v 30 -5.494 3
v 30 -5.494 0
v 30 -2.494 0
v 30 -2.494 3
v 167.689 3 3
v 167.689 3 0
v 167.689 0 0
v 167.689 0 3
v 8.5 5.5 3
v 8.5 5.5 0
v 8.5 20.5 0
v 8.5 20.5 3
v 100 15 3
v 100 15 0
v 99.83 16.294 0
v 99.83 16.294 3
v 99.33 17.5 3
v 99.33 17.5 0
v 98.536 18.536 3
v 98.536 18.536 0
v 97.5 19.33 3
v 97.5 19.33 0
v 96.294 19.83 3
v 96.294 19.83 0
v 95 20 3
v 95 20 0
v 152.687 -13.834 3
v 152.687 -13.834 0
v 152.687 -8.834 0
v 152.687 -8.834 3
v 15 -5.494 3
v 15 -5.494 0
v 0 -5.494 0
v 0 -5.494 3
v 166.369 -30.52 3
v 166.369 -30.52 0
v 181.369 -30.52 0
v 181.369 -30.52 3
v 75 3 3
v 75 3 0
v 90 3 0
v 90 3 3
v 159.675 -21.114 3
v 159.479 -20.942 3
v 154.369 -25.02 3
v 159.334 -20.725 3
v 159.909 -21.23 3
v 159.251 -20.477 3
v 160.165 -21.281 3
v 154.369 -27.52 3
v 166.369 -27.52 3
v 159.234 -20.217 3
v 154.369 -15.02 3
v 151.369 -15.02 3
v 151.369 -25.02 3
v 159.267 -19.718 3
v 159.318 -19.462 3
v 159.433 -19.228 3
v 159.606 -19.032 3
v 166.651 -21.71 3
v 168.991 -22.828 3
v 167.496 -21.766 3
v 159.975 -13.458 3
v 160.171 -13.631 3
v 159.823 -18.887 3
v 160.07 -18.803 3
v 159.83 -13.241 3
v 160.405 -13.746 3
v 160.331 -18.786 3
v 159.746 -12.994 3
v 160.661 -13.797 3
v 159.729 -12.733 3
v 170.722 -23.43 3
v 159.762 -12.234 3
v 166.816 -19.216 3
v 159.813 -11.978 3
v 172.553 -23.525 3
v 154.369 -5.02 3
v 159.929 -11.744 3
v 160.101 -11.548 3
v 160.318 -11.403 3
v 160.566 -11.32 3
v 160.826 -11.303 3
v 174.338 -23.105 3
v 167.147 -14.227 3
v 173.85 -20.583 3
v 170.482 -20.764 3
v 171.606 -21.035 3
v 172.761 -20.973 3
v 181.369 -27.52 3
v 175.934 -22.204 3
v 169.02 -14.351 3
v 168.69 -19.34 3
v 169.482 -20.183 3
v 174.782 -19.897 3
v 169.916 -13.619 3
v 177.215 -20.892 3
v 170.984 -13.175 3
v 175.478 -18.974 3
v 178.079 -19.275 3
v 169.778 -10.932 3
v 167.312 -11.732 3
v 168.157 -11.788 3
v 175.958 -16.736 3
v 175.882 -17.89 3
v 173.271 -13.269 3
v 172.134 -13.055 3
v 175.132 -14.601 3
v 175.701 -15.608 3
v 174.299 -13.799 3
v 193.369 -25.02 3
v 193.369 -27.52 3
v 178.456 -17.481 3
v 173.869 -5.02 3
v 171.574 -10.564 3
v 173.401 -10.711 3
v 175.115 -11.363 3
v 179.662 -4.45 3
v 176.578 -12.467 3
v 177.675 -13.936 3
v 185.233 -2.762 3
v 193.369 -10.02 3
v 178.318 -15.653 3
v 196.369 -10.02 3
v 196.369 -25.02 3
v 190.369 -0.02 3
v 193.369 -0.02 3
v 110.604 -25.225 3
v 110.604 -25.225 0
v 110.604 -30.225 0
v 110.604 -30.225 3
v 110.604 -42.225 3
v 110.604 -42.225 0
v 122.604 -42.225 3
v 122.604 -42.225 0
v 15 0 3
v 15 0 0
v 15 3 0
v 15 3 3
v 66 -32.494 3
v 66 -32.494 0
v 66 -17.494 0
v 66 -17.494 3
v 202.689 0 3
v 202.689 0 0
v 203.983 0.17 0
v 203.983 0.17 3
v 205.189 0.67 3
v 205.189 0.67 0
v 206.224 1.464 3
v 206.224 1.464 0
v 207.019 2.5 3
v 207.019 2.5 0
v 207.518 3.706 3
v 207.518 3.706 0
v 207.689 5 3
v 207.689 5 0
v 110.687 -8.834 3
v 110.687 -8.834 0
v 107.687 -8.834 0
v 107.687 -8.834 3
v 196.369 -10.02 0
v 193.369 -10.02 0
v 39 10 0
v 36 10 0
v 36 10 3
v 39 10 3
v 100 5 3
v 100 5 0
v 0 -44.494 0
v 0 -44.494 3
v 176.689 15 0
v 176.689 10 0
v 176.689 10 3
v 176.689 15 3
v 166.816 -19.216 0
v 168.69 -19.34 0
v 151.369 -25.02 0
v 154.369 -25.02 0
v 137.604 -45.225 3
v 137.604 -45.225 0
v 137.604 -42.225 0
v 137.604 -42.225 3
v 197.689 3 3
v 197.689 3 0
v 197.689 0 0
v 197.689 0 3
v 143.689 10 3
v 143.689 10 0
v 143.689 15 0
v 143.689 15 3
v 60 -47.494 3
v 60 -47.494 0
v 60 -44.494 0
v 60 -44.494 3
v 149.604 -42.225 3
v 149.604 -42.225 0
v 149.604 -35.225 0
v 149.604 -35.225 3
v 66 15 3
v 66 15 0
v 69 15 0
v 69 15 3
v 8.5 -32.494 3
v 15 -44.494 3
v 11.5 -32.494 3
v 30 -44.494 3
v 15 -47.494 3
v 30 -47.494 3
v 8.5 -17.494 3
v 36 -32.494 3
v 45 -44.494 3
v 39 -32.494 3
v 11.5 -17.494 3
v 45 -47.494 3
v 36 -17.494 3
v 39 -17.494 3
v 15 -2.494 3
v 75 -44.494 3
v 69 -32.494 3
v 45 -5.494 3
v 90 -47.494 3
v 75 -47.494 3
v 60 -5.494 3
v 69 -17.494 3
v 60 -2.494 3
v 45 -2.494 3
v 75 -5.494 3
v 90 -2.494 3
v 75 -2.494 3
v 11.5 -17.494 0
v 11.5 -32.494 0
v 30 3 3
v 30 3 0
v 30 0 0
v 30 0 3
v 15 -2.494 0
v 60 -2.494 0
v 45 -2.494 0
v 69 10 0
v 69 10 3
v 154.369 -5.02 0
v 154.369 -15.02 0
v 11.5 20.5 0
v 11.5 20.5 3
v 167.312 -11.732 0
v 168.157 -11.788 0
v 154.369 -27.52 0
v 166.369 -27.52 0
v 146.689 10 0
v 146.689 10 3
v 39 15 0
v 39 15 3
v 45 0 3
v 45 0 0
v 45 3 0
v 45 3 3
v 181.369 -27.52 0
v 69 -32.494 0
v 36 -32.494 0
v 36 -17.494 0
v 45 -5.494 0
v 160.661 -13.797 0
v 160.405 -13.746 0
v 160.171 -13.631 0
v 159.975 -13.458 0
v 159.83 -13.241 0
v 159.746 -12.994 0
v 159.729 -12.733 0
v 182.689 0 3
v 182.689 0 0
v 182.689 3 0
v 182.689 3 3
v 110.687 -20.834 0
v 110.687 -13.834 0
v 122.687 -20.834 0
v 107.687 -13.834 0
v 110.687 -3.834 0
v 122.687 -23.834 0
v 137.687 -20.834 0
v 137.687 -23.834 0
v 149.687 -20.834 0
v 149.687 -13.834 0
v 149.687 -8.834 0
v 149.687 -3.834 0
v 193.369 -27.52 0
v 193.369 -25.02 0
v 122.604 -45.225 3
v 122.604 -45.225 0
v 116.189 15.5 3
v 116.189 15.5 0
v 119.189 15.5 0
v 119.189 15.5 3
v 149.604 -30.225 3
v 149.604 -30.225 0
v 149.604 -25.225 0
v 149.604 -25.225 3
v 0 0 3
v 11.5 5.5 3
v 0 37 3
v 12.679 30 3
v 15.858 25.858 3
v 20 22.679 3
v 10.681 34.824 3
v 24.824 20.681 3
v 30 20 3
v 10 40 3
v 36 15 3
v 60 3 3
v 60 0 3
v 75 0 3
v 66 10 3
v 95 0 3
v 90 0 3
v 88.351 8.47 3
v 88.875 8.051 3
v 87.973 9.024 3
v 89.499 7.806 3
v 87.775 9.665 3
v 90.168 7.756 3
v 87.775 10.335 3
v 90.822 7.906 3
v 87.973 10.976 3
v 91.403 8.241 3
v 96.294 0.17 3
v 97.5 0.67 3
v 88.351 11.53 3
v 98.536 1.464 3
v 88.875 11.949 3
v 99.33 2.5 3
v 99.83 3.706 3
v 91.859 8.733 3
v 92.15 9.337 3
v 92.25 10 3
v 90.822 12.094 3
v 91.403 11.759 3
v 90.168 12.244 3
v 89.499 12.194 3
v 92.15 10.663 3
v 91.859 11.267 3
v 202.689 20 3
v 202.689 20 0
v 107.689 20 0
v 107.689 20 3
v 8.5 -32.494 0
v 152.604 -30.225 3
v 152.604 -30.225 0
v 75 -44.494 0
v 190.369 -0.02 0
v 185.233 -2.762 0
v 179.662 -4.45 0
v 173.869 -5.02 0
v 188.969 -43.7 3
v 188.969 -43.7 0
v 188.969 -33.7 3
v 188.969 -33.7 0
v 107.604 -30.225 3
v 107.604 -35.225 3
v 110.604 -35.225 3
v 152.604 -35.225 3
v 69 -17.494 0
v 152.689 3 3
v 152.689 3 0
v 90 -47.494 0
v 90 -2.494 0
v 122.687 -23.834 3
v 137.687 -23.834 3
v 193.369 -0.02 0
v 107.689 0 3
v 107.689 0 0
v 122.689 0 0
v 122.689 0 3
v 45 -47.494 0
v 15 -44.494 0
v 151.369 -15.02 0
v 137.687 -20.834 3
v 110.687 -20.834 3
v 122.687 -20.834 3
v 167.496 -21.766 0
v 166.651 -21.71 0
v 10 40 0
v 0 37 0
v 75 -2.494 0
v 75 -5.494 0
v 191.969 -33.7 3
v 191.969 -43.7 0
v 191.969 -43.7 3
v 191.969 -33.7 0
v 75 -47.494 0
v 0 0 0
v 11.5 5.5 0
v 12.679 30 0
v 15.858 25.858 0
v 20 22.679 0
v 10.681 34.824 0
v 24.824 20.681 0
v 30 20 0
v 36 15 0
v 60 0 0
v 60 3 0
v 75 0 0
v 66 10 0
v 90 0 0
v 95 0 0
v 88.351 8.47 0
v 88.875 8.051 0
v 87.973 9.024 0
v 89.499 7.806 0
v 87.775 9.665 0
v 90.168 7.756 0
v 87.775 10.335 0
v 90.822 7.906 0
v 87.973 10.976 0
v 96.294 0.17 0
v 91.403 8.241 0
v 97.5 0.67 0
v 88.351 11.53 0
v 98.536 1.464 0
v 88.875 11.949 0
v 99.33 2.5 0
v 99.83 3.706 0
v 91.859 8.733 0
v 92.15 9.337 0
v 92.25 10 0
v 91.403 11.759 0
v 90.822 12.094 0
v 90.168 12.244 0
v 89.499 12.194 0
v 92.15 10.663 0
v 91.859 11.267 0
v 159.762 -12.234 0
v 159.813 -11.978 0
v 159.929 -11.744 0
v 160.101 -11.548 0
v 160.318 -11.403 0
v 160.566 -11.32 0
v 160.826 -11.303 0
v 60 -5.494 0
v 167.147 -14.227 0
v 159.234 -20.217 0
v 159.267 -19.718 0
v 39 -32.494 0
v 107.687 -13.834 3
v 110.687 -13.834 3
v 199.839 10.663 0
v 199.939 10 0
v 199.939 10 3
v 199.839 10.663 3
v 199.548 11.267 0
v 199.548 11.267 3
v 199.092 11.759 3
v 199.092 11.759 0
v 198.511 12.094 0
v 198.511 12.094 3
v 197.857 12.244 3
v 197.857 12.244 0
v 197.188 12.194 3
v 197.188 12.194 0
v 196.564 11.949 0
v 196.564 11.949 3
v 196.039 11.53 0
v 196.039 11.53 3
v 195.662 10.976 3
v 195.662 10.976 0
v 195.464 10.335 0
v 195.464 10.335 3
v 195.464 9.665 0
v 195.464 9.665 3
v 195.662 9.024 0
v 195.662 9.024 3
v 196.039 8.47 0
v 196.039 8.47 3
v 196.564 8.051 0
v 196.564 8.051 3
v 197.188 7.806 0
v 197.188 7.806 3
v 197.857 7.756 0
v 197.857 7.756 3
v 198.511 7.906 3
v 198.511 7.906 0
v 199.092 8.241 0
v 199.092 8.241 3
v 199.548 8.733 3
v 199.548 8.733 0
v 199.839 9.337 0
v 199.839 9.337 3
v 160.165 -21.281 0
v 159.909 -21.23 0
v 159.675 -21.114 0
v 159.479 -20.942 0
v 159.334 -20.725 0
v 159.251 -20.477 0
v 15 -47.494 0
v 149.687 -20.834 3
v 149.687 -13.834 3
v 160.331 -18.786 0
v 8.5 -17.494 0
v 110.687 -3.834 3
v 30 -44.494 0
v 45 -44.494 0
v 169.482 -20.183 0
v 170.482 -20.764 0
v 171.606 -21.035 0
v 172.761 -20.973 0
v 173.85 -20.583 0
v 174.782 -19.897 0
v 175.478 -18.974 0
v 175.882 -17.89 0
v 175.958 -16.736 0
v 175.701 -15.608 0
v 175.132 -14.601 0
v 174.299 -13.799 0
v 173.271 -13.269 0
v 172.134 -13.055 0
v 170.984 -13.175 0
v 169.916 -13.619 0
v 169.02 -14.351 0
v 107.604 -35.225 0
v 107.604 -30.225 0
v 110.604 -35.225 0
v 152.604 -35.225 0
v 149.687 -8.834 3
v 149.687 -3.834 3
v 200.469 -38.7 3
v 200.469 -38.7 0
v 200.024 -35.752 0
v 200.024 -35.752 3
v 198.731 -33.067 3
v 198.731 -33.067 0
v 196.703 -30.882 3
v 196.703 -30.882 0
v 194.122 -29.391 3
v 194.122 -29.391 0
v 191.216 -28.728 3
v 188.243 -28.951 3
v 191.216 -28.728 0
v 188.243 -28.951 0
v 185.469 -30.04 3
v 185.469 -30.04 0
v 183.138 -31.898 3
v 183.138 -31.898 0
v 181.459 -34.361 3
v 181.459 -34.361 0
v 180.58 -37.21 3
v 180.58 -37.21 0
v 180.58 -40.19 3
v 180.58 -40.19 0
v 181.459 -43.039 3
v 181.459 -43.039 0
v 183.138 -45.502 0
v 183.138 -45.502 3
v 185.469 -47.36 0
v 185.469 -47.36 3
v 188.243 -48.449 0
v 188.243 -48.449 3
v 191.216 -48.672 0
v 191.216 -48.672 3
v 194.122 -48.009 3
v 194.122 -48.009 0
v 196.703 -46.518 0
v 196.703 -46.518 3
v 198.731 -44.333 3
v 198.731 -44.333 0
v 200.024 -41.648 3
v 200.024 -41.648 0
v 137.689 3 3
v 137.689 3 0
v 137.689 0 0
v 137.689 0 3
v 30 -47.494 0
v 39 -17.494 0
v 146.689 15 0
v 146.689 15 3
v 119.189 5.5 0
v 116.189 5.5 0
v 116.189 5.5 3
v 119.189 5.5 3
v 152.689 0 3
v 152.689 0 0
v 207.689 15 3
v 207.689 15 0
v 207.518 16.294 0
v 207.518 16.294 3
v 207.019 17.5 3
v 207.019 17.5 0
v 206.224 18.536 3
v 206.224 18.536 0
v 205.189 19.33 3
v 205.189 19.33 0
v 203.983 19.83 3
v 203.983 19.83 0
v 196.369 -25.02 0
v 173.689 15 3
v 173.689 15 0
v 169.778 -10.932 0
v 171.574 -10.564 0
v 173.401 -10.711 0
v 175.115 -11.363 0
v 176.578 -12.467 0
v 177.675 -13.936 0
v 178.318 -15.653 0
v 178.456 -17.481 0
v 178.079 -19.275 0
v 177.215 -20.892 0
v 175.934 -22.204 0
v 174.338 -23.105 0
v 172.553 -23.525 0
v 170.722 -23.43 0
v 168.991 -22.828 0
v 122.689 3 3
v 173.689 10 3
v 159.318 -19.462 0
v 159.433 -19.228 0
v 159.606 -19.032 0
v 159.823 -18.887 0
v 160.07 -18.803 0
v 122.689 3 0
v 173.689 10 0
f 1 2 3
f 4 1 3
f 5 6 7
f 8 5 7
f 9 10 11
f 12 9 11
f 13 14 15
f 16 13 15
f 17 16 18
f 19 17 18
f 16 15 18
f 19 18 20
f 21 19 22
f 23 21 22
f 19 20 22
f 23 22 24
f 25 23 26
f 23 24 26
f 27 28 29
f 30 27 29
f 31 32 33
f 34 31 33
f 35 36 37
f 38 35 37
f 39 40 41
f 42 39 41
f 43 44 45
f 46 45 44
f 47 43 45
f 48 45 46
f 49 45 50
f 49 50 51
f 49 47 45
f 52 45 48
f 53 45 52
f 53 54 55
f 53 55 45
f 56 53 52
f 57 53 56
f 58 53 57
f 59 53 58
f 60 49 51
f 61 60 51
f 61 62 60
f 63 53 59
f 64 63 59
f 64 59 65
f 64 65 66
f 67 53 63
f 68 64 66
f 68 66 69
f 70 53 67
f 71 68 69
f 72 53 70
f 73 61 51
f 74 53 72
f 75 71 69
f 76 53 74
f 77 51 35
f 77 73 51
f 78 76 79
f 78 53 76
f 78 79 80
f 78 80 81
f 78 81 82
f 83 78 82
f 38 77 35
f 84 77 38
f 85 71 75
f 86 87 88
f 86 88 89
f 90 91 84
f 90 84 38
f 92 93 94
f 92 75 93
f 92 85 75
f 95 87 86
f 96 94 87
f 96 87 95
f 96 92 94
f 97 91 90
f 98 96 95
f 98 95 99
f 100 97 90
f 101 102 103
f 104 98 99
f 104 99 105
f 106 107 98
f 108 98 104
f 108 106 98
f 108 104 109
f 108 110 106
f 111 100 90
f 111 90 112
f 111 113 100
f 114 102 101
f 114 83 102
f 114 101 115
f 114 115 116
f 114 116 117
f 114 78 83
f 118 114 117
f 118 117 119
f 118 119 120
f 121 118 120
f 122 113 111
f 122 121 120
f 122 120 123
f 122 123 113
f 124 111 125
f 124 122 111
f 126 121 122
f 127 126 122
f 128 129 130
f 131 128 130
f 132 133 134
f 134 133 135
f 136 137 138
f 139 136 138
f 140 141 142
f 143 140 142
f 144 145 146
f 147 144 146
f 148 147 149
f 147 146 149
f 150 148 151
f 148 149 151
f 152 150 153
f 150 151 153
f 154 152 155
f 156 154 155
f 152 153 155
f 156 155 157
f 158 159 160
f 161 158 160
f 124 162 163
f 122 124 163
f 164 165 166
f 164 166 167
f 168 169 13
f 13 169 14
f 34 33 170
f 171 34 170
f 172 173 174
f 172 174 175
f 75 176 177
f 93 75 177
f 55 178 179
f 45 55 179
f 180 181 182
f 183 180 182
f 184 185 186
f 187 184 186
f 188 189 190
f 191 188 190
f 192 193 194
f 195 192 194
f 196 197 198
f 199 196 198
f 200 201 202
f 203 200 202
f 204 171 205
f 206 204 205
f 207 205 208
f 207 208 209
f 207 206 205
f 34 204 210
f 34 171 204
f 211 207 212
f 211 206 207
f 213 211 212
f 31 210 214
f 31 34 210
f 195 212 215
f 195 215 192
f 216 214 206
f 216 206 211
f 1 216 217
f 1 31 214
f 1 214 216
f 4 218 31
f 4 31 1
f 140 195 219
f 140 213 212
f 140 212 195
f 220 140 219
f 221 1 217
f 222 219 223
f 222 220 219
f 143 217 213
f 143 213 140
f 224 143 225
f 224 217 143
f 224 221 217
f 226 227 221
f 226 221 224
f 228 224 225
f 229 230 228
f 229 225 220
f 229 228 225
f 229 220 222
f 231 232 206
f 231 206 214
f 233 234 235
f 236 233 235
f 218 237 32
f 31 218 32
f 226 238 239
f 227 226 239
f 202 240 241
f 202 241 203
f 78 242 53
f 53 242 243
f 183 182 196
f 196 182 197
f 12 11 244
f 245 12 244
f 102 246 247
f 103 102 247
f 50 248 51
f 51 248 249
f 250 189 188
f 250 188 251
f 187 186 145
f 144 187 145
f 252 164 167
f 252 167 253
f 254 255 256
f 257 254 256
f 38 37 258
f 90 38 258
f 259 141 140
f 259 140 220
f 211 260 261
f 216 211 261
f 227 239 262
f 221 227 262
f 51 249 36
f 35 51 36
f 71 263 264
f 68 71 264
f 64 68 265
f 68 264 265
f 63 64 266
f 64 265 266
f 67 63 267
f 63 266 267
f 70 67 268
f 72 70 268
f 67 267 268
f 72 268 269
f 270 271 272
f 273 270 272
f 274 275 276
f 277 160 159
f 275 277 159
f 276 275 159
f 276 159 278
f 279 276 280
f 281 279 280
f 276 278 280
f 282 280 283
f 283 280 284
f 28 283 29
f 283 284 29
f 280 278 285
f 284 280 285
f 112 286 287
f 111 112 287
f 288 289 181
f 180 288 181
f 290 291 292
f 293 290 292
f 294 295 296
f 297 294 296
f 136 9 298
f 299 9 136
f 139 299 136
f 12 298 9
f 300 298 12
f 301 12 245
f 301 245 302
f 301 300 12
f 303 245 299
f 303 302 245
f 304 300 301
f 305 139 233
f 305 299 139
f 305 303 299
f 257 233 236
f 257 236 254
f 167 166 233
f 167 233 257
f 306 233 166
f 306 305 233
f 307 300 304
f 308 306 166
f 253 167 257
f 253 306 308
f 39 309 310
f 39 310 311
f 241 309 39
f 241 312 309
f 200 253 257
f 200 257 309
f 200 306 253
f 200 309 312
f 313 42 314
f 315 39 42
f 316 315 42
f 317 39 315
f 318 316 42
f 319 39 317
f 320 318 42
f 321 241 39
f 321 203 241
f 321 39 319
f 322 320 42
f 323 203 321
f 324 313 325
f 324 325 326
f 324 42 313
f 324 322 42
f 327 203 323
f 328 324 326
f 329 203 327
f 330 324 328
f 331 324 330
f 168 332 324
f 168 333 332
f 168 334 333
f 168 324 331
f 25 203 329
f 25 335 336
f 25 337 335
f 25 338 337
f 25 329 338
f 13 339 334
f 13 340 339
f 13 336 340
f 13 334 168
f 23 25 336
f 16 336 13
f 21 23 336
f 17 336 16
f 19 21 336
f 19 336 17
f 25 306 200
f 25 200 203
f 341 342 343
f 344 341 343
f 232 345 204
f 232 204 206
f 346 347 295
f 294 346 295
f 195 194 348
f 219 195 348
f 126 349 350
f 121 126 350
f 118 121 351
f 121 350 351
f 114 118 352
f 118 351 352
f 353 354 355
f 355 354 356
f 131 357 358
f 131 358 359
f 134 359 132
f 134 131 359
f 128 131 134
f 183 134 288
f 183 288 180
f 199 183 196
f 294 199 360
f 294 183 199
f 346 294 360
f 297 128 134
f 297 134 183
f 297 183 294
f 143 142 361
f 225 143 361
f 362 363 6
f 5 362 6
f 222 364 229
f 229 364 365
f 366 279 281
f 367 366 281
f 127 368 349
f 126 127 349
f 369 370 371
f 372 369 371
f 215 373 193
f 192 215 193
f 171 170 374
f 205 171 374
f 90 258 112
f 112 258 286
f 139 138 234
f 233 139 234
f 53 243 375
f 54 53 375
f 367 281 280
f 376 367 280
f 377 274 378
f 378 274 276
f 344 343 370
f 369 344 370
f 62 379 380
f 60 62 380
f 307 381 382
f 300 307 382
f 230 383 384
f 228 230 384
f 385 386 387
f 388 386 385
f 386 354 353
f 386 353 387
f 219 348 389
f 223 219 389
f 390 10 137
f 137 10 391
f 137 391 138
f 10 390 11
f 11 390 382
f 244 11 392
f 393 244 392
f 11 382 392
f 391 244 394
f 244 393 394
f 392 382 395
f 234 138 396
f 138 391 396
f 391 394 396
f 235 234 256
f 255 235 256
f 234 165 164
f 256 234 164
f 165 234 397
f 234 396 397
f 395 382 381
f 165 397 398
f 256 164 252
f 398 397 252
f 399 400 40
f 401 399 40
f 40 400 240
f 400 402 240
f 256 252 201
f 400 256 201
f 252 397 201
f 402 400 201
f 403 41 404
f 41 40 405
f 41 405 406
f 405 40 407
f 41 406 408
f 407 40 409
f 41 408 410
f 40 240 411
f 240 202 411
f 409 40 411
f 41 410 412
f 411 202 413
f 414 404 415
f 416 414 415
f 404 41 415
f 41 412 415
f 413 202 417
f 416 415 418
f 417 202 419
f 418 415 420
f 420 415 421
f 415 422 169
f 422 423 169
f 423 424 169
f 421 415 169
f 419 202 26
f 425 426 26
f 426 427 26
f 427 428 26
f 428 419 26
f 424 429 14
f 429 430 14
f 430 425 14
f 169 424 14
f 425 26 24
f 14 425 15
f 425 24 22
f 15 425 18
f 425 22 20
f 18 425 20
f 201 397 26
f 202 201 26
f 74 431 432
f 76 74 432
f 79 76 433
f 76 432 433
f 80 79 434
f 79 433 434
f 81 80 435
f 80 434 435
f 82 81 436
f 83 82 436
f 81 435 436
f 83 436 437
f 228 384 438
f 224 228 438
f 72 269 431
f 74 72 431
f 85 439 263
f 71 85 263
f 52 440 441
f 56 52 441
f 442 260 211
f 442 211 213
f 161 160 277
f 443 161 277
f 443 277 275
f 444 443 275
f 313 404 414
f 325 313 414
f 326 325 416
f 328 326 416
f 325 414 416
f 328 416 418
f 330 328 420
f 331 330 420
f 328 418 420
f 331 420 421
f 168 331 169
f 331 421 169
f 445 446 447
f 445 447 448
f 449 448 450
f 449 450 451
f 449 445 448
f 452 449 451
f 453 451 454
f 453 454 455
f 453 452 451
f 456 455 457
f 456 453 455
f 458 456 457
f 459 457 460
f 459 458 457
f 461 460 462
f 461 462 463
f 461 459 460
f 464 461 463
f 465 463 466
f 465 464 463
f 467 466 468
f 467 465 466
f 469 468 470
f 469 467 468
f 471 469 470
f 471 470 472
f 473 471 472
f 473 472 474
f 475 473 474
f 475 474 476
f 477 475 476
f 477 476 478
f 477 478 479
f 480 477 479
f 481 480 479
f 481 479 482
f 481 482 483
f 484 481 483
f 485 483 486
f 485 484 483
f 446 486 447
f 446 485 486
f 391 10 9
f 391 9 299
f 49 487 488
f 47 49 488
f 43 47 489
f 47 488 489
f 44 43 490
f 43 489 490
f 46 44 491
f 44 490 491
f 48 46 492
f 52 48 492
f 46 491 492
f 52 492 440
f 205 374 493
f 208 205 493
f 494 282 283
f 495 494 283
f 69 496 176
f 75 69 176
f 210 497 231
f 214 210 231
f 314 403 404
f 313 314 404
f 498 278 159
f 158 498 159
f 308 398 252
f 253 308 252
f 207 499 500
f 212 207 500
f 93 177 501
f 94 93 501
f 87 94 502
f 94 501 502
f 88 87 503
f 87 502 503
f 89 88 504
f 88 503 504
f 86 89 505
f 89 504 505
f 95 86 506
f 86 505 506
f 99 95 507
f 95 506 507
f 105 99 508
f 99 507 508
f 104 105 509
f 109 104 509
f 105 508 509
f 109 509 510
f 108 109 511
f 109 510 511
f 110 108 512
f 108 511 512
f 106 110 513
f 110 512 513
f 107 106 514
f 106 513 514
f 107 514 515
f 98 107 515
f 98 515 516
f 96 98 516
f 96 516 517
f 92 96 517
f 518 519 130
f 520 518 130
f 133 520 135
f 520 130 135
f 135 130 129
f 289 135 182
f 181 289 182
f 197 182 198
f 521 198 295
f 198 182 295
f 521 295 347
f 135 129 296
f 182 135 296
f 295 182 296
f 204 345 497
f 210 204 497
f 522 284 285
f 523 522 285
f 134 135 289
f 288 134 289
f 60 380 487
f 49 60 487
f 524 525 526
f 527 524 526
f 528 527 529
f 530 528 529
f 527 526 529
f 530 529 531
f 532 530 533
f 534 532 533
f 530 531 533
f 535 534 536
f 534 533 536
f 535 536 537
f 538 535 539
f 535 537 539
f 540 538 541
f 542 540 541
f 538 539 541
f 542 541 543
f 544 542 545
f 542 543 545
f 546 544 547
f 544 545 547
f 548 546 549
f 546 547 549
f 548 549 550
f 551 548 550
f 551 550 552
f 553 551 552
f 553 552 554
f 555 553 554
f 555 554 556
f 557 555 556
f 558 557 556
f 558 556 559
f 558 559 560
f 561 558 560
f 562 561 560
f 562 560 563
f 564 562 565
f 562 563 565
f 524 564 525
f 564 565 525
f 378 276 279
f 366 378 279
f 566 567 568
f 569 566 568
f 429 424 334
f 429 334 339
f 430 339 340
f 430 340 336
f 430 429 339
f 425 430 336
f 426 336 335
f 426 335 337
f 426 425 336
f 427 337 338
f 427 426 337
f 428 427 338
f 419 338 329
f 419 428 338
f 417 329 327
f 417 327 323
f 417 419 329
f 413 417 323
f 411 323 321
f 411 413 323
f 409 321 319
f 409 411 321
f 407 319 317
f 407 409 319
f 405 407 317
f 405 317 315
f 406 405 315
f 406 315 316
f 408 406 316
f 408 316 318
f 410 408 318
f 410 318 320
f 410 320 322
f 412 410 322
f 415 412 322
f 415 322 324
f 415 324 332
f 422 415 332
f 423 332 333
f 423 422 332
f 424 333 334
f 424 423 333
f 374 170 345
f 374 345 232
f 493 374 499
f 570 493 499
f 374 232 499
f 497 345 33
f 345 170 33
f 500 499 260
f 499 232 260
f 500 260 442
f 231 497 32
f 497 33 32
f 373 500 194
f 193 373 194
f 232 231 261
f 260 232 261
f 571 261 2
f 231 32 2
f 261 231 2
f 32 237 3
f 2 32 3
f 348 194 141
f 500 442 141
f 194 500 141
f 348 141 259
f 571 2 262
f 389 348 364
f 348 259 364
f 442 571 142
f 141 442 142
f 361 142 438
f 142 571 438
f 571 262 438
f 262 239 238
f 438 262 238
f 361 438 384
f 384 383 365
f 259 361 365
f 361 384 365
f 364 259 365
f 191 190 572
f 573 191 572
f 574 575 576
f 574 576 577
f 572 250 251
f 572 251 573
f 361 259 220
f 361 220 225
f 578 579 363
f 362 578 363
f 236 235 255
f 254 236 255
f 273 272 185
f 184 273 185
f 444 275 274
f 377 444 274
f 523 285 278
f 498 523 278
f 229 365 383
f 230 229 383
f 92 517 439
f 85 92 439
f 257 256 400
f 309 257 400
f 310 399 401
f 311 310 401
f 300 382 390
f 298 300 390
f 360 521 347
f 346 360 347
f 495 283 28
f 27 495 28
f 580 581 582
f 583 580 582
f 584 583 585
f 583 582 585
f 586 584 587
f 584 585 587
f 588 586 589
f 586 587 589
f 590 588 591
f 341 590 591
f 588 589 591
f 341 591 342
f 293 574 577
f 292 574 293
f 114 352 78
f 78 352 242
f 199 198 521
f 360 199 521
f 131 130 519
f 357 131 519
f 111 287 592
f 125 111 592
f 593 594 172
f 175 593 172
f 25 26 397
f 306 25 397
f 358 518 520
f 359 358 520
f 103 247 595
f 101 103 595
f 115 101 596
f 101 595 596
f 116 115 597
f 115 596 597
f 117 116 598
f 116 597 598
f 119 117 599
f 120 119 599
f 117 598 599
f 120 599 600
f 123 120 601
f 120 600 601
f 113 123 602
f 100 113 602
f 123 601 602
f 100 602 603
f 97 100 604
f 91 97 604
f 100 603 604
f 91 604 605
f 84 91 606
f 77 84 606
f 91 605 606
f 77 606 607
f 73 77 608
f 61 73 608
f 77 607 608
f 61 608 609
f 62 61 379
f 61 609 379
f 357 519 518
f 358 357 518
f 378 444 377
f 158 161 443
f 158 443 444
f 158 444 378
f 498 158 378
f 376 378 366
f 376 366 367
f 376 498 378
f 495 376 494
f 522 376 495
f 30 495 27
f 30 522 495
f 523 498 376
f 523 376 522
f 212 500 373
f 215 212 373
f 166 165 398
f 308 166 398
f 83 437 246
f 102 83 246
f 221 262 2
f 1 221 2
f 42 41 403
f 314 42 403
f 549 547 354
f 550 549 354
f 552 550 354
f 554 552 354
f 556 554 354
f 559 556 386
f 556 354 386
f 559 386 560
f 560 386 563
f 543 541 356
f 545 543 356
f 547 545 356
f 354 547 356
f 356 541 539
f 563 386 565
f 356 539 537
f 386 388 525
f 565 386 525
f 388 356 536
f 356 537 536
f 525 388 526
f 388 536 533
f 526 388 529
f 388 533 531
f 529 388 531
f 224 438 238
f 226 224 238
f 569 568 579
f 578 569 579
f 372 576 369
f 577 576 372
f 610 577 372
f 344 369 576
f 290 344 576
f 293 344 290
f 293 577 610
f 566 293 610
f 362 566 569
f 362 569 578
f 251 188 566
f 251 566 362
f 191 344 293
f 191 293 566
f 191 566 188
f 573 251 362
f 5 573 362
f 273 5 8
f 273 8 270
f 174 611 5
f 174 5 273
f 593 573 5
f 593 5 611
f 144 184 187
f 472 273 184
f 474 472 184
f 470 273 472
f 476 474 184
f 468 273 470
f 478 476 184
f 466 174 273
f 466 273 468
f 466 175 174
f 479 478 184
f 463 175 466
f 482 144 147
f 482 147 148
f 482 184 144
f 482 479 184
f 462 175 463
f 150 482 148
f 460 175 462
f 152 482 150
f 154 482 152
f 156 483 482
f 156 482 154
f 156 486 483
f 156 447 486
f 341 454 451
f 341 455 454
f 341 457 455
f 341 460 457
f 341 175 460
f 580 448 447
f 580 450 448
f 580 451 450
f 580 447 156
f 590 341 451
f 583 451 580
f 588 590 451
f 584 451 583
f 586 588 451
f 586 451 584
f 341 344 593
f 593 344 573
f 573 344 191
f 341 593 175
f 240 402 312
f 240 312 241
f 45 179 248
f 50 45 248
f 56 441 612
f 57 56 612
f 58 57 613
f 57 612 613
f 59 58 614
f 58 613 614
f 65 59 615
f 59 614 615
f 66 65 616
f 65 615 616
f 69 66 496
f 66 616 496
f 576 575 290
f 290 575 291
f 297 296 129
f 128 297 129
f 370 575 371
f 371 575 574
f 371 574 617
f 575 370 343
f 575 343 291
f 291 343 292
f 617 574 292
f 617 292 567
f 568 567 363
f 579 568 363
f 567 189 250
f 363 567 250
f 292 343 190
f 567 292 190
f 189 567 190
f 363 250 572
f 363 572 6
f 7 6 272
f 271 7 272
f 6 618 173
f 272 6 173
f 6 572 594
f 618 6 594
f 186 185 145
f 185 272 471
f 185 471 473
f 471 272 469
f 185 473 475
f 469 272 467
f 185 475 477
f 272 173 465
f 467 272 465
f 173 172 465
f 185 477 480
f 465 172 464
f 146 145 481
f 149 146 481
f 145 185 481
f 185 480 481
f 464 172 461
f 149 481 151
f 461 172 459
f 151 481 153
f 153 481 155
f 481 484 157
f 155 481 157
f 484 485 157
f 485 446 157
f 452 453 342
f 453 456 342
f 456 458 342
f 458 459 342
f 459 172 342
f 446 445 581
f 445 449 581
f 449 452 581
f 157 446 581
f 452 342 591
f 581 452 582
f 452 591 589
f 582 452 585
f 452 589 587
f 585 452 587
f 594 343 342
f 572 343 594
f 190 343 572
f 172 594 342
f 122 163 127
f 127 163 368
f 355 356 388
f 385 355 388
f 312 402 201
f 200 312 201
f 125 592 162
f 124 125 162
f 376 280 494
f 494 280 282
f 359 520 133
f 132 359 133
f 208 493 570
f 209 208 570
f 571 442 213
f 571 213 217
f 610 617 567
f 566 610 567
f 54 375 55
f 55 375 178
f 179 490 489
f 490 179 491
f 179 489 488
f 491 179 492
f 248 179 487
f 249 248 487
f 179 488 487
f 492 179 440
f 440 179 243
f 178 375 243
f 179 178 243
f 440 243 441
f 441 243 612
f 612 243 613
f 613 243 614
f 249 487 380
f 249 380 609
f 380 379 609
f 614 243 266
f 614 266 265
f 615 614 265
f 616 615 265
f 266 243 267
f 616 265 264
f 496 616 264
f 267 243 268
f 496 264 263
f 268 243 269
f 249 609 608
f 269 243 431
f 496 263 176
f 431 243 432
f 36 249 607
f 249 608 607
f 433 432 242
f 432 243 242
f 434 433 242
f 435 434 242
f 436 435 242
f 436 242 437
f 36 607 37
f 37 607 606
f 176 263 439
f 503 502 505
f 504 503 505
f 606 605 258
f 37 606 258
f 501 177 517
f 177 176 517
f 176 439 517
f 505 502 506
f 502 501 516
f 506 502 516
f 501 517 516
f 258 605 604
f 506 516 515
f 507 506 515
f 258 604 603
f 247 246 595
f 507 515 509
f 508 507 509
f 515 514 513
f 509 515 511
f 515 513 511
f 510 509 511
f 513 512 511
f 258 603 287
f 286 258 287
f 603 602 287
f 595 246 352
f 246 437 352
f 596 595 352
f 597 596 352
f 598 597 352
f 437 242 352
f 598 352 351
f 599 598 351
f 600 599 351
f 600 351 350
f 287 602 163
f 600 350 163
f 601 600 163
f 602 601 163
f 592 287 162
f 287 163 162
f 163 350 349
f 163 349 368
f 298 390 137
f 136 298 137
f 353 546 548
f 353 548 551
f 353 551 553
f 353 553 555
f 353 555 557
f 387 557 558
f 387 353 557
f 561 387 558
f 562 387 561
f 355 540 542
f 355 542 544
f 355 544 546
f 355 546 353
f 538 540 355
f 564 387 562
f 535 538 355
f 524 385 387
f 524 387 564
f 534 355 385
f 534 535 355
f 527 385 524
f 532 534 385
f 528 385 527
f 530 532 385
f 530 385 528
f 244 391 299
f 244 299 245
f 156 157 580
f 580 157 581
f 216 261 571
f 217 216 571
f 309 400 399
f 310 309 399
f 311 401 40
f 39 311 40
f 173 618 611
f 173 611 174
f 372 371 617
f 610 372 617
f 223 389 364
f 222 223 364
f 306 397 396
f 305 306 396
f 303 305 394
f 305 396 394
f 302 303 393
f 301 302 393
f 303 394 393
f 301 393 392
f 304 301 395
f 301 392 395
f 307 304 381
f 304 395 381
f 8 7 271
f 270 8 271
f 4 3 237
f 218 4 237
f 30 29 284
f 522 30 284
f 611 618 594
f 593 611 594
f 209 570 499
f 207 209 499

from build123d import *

# Parameters (mm, degrees)
F1_R     = 10
F1_W     = 3
F1_H     = 10
F2_DEPTH = 3
F1_H_2   = 5
F1_R_2   = 2.25
F1_H_3   = 15


# Not quite as in the source:
# - a feature names something its author has since deleted; it is built from what else it names


with BuildPart() as f2:
    # F1 (on Top) → F2 (new body)
    with BuildSketch(Plane.XY):
        with Locations((190.4685690403, -38.7000021338)):
            Circle(F1_R)
        with Locations((190.4685690403, -38.7000021338)):
            Rectangle(F1_W, F1_H, mode=Mode.SUBTRACT)
    extrude(amount=F2_DEPTH)


with BuildPart() as f2b:
    # F1 (on Top) → F2, piece 2 (new body)
    with BuildSketch(Plane.XY):
        with BuildLine():
            Line((154.3685435057, -25.0202883035), (154.3685435057, -27.5202883035))
            Line((154.3685435057, -27.5202883035), (166.3685435057, -27.5202883035))
            Line((166.3685435057, -27.5202883035), (166.3685435057, -30.5202883035))
            Line((166.3685435057, -30.5202883035), (173.8685435057, -30.5202883035))
            Line((173.8685435057, -30.5202883035), (181.3685435057, -30.5202883035))
            Line((181.3685435057, -30.5202883035), (181.3685435057, -27.5202883035))
            Line((181.3685435057, -27.5202883035), (193.3685435057, -27.5202883035))
            Line((193.3685435057, -27.5202883035), (193.3685435057, -25.0202883035))
            Line((193.3685435057, -25.0202883035), (196.3685435057, -25.0202883035))
            Line((196.3685435057, -25.0202883035), (196.3685435057, -10.0202883035))
            Line((196.3685435057, -10.0202883035), (193.3685435057, -10.0202883035))
            Line((193.3685435057, -10.0202883035), (193.3685435057, -0.0202883035))
            Line((193.3685435057, -0.0202883035), (190.3685435057, -0.0202883035))
            ThreePointArc((190.3685435057, -0.0202883035), (182.4890133305, -3.7428387253), (173.8685435057, -5.0202883035))
            Line((173.8685435057, -5.0202883035), (154.3685435057, -5.0202883035))
            Line((154.3685435057, -5.0202883035), (154.3685435057, -15.0202883035))
            Line((154.3685435057, -15.0202883035), (151.3685435057, -15.0202883035))
            Line((151.3685435057, -15.0202883035), (151.3685435057, -25.0202883035))
            Line((151.3685435057, -25.0202883035), (154.3685435057, -25.0202883035))
        make_face()
        with BuildLine():
            Line((169.0201585277, -14.3506918411), (167.1467590467, -14.2266580037))
            Line((167.1467590467, -14.2266580037), (160.6609587085, -13.7972468117))
            ThreePointArc((160.6609587085, -13.7972468117), (159.9747461278, -13.4582796573), (159.7292065321, -12.7333681147))
            Line((159.7292065321, -12.7333681147), (159.7622381623, -12.2344603964))
            ThreePointArc((159.7622381623, -12.2344603964), (160.1012053166, -11.5482478157), (160.8261168592, -11.30270822))
            Line((160.8261168592, -11.30270822), (167.3119171975, -11.7321194121))
            Line((167.3119171975, -11.7321194121), (168.1567556224, -11.7880543864))
            ThreePointArc((168.1567556224, -11.7880543864), (178.4564784175, -17.480924089), (167.4961230192, -21.766208753))
            Line((167.4961230192, -21.766208753), (166.6512845944, -21.7102737787))
            Line((166.6512845944, -21.7102737787), (160.1654842561, -21.2808625866))
            ThreePointArc((160.1654842561, -21.2808625866), (159.4792716754, -20.9418954323), (159.2337320797, -20.2169838897))
            Line((159.2337320797, -20.2169838897), (159.2667637099, -19.7180761713))
            ThreePointArc((159.2667637099, -19.7180761713), (159.6057308643, -19.0318635907), (160.3306424069, -18.786323995))
            Line((160.3306424069, -18.786323995), (166.8164427452, -19.215735187))
            Line((166.8164427452, -19.215735187), (168.6898422261, -19.3397690244))
            ThreePointArc((168.6898422261, -19.3397690244), (175.9619398259, -17.3157659382), (169.0201585277, -14.3506918411))
        make_face(mode=Mode.SUBTRACT)
    extrude(amount=F2_DEPTH)


with BuildPart() as f2c:
    # F1 (on Top) → F2, piece 3 (new body)
    with BuildSketch(Plane.XY):
        with BuildLine():
            Line((107.6887845993, 20), (107.6887845993, 0))
            Line((107.6887845993, 0), (122.6887845993, 0))
            Line((122.6887845993, 0), (122.6887845993, 3))
            Line((122.6887845993, 3), (137.6887845993, 3))
            Line((137.6887845993, 3), (137.6887845993, 0))
            Line((137.6887845993, 0), (152.6887845993, 0))
            Line((152.6887845993, 0), (152.6887845993, 3))
            Line((152.6887845993, 3), (167.6887845993, 3))
            Line((167.6887845993, 3), (167.6887845993, 0))
            Line((167.6887845993, 0), (182.6887845993, 0))
            Line((182.6887845993, 0), (182.6887845993, 3))
            Line((182.6887845993, 3), (197.6887845993, 3))
            Line((197.6887845993, 3), (197.6887845993, 0))
            Line((197.6887845993, 0), (202.6887845993, 0))
            ThreePointArc((202.6887845993, 0), (206.2243185052, 1.4644660941), (207.6887845993, 5))
            Line((207.6887845993, 5), (207.6887845993, 15))
            ThreePointArc((207.6887845993, 15), (206.2243185052, 18.5355339059), (202.6887845993, 20))
            Line((202.6887845993, 20), (137.6887845993, 20))
            Line((137.6887845993, 20), (107.6887845993, 20))
        make_face()
        with Locations((117.6887845993, 10.5)):
            Rectangle(F1_W, F1_H, mode=Mode.SUBTRACT)
        with Locations((145.1887845993, 12.5)):
            Rectangle(F1_W, F1_H_2, mode=Mode.SUBTRACT)
        with Locations((175.1887845993, 12.5)):
            Rectangle(F1_W, F1_H_2, mode=Mode.SUBTRACT)
        with Locations((197.6887845993, 10)):
            Circle(F1_R_2, mode=Mode.SUBTRACT)
    extrude(amount=F2_DEPTH)


with BuildPart() as f2d:
    # F1 (on Top) → F2, piece 4 (new body)
    with BuildSketch(Plane.XY):
        Polygon((15, -5.493568331), (0, -5.493568331), (0, -24.993568331), (0, -44.493568331), (15, -44.493568331), (15, -47.493568331), (30, -47.493568331), (30, -44.493568331), (45, -44.493568331), (45, -47.493568331), (60, -47.493568331), (60, -44.493568331), (75, -44.493568331), (75, -47.493568331), (90, -47.493568331), (90, -44.493568331), (90, -24.993568331), (90, -5.493568331), (90, -2.493568331), (75, -2.493568331), (75, -5.493568331), (60, -5.493568331), (60, -2.493568331), (45, -2.493568331), (45, -5.493568331), (30, -5.493568331), (30, -2.493568331), (15, -2.493568331), align=None)
        with Locations((10, -24.993568331)):
            Rectangle(F1_W, F1_H_3, mode=Mode.SUBTRACT)
        with Locations((37.5, -24.993568331)):
            Rectangle(F1_W, F1_H_3, mode=Mode.SUBTRACT)
        with Locations((67.5, -24.993568331)):
            Rectangle(F1_W, F1_H_3, mode=Mode.SUBTRACT)
    extrude(amount=F2_DEPTH)


with BuildPart() as f2e:
    # F1 (on Top) → F2, piece 5 (new body)
    with BuildSketch(Plane.XY):
        Polygon((130.1870310709, -3.8339694942), (110.6870310709, -3.8339694942), (110.6870310709, -8.8339694942), (107.6870310709, -8.8339694942), (107.6870310709, -13.8339694942), (110.6870310709, -13.8339694942), (110.6870310709, -20.8339694942), (122.6870310709, -20.8339694942), (122.6870310709, -23.8339694942), (130.1870310709, -23.8339694942), (137.6870310709, -23.8339694942), (137.6870310709, -20.8339694942), (149.6870310709, -20.8339694942), (149.6870310709, -13.8339694942), (152.6870310709, -13.8339694942), (152.6870310709, -8.8339694942), (149.6870310709, -8.8339694942), (149.6870310709, -3.8339694942), align=None)
    extrude(amount=F2_DEPTH)


with BuildPart() as f2f:
    # F1 (on Top) → F2, piece 6 (new body)
    with BuildSketch(Plane.XY):
        Polygon((130.1044501066, -25.2247648239), (110.6044501066, -25.2247648239), (110.6044501066, -30.2247648239), (107.6044501066, -30.2247648239), (107.6044501066, -35.2247648239), (110.6044501066, -35.2247648239), (110.6044501066, -42.2247648239), (122.6044501066, -42.2247648239), (122.6044501066, -45.2247648239), (130.1044501066, -45.2247648239), (137.6044501066, -45.2247648239), (137.6044501066, -42.2247648239), (149.6044501066, -42.2247648239), (149.6044501066, -35.2247648239), (152.6044501066, -35.2247648239), (152.6044501066, -30.2247648239), (149.6044501066, -30.2247648239), (149.6044501066, -25.2247648239), align=None)
    extrude(amount=F2_DEPTH)


with BuildPart() as f2g:
    # F1 (on Top) → F2, piece 7 (new body)
    with BuildSketch(Plane.XY):
        with BuildLine():
            ThreePointArc((30, 20), (15.8578643763, 25.8578643763), (10, 40))
            Line((10, 40), (0, 37))
            Line((0, 37), (0, 0))
            Line((0, 0), (15, 0))
            Line((15, 0), (15, 3))
            Line((15, 3), (30, 3))
            Line((30, 3), (30, 0))
            Line((30, 0), (45, 0))
            Line((45, 0), (45, 3))
            Line((45, 3), (60, 3))
            Line((60, 3), (60, 0))
            Line((60, 0), (75, 0))
            Line((75, 0), (75, 3))
            Line((75, 3), (90, 3))
            Line((90, 3), (90, 0))
            Line((90, 0), (95, 0))
            ThreePointArc((95, 0), (98.5355339059, 1.4644660941), (100, 5))
            Line((100, 5), (100, 15))
            ThreePointArc((100, 15), (98.5355339059, 18.5355339059), (95, 20))
            Line((95, 20), (30, 20))
        make_face()
        with Locations((10, 13)):
            Rectangle(F1_W, F1_H_3, mode=Mode.SUBTRACT)
        with Locations((37.5, 12.5)):
            Rectangle(F1_W, F1_H_2, mode=Mode.SUBTRACT)
        with Locations((67.5, 12.5)):
            Rectangle(F1_W, F1_H_2, mode=Mode.SUBTRACT)
        with Locations((90, 10)):
            Circle(F1_R_2, mode=Mode.SUBTRACT)
    extrude(amount=F2_DEPTH)


solid = Compound([f2.part, f2b.part, f2c.part, f2d.part, f2e.part, f2f.part, f2g.part])
